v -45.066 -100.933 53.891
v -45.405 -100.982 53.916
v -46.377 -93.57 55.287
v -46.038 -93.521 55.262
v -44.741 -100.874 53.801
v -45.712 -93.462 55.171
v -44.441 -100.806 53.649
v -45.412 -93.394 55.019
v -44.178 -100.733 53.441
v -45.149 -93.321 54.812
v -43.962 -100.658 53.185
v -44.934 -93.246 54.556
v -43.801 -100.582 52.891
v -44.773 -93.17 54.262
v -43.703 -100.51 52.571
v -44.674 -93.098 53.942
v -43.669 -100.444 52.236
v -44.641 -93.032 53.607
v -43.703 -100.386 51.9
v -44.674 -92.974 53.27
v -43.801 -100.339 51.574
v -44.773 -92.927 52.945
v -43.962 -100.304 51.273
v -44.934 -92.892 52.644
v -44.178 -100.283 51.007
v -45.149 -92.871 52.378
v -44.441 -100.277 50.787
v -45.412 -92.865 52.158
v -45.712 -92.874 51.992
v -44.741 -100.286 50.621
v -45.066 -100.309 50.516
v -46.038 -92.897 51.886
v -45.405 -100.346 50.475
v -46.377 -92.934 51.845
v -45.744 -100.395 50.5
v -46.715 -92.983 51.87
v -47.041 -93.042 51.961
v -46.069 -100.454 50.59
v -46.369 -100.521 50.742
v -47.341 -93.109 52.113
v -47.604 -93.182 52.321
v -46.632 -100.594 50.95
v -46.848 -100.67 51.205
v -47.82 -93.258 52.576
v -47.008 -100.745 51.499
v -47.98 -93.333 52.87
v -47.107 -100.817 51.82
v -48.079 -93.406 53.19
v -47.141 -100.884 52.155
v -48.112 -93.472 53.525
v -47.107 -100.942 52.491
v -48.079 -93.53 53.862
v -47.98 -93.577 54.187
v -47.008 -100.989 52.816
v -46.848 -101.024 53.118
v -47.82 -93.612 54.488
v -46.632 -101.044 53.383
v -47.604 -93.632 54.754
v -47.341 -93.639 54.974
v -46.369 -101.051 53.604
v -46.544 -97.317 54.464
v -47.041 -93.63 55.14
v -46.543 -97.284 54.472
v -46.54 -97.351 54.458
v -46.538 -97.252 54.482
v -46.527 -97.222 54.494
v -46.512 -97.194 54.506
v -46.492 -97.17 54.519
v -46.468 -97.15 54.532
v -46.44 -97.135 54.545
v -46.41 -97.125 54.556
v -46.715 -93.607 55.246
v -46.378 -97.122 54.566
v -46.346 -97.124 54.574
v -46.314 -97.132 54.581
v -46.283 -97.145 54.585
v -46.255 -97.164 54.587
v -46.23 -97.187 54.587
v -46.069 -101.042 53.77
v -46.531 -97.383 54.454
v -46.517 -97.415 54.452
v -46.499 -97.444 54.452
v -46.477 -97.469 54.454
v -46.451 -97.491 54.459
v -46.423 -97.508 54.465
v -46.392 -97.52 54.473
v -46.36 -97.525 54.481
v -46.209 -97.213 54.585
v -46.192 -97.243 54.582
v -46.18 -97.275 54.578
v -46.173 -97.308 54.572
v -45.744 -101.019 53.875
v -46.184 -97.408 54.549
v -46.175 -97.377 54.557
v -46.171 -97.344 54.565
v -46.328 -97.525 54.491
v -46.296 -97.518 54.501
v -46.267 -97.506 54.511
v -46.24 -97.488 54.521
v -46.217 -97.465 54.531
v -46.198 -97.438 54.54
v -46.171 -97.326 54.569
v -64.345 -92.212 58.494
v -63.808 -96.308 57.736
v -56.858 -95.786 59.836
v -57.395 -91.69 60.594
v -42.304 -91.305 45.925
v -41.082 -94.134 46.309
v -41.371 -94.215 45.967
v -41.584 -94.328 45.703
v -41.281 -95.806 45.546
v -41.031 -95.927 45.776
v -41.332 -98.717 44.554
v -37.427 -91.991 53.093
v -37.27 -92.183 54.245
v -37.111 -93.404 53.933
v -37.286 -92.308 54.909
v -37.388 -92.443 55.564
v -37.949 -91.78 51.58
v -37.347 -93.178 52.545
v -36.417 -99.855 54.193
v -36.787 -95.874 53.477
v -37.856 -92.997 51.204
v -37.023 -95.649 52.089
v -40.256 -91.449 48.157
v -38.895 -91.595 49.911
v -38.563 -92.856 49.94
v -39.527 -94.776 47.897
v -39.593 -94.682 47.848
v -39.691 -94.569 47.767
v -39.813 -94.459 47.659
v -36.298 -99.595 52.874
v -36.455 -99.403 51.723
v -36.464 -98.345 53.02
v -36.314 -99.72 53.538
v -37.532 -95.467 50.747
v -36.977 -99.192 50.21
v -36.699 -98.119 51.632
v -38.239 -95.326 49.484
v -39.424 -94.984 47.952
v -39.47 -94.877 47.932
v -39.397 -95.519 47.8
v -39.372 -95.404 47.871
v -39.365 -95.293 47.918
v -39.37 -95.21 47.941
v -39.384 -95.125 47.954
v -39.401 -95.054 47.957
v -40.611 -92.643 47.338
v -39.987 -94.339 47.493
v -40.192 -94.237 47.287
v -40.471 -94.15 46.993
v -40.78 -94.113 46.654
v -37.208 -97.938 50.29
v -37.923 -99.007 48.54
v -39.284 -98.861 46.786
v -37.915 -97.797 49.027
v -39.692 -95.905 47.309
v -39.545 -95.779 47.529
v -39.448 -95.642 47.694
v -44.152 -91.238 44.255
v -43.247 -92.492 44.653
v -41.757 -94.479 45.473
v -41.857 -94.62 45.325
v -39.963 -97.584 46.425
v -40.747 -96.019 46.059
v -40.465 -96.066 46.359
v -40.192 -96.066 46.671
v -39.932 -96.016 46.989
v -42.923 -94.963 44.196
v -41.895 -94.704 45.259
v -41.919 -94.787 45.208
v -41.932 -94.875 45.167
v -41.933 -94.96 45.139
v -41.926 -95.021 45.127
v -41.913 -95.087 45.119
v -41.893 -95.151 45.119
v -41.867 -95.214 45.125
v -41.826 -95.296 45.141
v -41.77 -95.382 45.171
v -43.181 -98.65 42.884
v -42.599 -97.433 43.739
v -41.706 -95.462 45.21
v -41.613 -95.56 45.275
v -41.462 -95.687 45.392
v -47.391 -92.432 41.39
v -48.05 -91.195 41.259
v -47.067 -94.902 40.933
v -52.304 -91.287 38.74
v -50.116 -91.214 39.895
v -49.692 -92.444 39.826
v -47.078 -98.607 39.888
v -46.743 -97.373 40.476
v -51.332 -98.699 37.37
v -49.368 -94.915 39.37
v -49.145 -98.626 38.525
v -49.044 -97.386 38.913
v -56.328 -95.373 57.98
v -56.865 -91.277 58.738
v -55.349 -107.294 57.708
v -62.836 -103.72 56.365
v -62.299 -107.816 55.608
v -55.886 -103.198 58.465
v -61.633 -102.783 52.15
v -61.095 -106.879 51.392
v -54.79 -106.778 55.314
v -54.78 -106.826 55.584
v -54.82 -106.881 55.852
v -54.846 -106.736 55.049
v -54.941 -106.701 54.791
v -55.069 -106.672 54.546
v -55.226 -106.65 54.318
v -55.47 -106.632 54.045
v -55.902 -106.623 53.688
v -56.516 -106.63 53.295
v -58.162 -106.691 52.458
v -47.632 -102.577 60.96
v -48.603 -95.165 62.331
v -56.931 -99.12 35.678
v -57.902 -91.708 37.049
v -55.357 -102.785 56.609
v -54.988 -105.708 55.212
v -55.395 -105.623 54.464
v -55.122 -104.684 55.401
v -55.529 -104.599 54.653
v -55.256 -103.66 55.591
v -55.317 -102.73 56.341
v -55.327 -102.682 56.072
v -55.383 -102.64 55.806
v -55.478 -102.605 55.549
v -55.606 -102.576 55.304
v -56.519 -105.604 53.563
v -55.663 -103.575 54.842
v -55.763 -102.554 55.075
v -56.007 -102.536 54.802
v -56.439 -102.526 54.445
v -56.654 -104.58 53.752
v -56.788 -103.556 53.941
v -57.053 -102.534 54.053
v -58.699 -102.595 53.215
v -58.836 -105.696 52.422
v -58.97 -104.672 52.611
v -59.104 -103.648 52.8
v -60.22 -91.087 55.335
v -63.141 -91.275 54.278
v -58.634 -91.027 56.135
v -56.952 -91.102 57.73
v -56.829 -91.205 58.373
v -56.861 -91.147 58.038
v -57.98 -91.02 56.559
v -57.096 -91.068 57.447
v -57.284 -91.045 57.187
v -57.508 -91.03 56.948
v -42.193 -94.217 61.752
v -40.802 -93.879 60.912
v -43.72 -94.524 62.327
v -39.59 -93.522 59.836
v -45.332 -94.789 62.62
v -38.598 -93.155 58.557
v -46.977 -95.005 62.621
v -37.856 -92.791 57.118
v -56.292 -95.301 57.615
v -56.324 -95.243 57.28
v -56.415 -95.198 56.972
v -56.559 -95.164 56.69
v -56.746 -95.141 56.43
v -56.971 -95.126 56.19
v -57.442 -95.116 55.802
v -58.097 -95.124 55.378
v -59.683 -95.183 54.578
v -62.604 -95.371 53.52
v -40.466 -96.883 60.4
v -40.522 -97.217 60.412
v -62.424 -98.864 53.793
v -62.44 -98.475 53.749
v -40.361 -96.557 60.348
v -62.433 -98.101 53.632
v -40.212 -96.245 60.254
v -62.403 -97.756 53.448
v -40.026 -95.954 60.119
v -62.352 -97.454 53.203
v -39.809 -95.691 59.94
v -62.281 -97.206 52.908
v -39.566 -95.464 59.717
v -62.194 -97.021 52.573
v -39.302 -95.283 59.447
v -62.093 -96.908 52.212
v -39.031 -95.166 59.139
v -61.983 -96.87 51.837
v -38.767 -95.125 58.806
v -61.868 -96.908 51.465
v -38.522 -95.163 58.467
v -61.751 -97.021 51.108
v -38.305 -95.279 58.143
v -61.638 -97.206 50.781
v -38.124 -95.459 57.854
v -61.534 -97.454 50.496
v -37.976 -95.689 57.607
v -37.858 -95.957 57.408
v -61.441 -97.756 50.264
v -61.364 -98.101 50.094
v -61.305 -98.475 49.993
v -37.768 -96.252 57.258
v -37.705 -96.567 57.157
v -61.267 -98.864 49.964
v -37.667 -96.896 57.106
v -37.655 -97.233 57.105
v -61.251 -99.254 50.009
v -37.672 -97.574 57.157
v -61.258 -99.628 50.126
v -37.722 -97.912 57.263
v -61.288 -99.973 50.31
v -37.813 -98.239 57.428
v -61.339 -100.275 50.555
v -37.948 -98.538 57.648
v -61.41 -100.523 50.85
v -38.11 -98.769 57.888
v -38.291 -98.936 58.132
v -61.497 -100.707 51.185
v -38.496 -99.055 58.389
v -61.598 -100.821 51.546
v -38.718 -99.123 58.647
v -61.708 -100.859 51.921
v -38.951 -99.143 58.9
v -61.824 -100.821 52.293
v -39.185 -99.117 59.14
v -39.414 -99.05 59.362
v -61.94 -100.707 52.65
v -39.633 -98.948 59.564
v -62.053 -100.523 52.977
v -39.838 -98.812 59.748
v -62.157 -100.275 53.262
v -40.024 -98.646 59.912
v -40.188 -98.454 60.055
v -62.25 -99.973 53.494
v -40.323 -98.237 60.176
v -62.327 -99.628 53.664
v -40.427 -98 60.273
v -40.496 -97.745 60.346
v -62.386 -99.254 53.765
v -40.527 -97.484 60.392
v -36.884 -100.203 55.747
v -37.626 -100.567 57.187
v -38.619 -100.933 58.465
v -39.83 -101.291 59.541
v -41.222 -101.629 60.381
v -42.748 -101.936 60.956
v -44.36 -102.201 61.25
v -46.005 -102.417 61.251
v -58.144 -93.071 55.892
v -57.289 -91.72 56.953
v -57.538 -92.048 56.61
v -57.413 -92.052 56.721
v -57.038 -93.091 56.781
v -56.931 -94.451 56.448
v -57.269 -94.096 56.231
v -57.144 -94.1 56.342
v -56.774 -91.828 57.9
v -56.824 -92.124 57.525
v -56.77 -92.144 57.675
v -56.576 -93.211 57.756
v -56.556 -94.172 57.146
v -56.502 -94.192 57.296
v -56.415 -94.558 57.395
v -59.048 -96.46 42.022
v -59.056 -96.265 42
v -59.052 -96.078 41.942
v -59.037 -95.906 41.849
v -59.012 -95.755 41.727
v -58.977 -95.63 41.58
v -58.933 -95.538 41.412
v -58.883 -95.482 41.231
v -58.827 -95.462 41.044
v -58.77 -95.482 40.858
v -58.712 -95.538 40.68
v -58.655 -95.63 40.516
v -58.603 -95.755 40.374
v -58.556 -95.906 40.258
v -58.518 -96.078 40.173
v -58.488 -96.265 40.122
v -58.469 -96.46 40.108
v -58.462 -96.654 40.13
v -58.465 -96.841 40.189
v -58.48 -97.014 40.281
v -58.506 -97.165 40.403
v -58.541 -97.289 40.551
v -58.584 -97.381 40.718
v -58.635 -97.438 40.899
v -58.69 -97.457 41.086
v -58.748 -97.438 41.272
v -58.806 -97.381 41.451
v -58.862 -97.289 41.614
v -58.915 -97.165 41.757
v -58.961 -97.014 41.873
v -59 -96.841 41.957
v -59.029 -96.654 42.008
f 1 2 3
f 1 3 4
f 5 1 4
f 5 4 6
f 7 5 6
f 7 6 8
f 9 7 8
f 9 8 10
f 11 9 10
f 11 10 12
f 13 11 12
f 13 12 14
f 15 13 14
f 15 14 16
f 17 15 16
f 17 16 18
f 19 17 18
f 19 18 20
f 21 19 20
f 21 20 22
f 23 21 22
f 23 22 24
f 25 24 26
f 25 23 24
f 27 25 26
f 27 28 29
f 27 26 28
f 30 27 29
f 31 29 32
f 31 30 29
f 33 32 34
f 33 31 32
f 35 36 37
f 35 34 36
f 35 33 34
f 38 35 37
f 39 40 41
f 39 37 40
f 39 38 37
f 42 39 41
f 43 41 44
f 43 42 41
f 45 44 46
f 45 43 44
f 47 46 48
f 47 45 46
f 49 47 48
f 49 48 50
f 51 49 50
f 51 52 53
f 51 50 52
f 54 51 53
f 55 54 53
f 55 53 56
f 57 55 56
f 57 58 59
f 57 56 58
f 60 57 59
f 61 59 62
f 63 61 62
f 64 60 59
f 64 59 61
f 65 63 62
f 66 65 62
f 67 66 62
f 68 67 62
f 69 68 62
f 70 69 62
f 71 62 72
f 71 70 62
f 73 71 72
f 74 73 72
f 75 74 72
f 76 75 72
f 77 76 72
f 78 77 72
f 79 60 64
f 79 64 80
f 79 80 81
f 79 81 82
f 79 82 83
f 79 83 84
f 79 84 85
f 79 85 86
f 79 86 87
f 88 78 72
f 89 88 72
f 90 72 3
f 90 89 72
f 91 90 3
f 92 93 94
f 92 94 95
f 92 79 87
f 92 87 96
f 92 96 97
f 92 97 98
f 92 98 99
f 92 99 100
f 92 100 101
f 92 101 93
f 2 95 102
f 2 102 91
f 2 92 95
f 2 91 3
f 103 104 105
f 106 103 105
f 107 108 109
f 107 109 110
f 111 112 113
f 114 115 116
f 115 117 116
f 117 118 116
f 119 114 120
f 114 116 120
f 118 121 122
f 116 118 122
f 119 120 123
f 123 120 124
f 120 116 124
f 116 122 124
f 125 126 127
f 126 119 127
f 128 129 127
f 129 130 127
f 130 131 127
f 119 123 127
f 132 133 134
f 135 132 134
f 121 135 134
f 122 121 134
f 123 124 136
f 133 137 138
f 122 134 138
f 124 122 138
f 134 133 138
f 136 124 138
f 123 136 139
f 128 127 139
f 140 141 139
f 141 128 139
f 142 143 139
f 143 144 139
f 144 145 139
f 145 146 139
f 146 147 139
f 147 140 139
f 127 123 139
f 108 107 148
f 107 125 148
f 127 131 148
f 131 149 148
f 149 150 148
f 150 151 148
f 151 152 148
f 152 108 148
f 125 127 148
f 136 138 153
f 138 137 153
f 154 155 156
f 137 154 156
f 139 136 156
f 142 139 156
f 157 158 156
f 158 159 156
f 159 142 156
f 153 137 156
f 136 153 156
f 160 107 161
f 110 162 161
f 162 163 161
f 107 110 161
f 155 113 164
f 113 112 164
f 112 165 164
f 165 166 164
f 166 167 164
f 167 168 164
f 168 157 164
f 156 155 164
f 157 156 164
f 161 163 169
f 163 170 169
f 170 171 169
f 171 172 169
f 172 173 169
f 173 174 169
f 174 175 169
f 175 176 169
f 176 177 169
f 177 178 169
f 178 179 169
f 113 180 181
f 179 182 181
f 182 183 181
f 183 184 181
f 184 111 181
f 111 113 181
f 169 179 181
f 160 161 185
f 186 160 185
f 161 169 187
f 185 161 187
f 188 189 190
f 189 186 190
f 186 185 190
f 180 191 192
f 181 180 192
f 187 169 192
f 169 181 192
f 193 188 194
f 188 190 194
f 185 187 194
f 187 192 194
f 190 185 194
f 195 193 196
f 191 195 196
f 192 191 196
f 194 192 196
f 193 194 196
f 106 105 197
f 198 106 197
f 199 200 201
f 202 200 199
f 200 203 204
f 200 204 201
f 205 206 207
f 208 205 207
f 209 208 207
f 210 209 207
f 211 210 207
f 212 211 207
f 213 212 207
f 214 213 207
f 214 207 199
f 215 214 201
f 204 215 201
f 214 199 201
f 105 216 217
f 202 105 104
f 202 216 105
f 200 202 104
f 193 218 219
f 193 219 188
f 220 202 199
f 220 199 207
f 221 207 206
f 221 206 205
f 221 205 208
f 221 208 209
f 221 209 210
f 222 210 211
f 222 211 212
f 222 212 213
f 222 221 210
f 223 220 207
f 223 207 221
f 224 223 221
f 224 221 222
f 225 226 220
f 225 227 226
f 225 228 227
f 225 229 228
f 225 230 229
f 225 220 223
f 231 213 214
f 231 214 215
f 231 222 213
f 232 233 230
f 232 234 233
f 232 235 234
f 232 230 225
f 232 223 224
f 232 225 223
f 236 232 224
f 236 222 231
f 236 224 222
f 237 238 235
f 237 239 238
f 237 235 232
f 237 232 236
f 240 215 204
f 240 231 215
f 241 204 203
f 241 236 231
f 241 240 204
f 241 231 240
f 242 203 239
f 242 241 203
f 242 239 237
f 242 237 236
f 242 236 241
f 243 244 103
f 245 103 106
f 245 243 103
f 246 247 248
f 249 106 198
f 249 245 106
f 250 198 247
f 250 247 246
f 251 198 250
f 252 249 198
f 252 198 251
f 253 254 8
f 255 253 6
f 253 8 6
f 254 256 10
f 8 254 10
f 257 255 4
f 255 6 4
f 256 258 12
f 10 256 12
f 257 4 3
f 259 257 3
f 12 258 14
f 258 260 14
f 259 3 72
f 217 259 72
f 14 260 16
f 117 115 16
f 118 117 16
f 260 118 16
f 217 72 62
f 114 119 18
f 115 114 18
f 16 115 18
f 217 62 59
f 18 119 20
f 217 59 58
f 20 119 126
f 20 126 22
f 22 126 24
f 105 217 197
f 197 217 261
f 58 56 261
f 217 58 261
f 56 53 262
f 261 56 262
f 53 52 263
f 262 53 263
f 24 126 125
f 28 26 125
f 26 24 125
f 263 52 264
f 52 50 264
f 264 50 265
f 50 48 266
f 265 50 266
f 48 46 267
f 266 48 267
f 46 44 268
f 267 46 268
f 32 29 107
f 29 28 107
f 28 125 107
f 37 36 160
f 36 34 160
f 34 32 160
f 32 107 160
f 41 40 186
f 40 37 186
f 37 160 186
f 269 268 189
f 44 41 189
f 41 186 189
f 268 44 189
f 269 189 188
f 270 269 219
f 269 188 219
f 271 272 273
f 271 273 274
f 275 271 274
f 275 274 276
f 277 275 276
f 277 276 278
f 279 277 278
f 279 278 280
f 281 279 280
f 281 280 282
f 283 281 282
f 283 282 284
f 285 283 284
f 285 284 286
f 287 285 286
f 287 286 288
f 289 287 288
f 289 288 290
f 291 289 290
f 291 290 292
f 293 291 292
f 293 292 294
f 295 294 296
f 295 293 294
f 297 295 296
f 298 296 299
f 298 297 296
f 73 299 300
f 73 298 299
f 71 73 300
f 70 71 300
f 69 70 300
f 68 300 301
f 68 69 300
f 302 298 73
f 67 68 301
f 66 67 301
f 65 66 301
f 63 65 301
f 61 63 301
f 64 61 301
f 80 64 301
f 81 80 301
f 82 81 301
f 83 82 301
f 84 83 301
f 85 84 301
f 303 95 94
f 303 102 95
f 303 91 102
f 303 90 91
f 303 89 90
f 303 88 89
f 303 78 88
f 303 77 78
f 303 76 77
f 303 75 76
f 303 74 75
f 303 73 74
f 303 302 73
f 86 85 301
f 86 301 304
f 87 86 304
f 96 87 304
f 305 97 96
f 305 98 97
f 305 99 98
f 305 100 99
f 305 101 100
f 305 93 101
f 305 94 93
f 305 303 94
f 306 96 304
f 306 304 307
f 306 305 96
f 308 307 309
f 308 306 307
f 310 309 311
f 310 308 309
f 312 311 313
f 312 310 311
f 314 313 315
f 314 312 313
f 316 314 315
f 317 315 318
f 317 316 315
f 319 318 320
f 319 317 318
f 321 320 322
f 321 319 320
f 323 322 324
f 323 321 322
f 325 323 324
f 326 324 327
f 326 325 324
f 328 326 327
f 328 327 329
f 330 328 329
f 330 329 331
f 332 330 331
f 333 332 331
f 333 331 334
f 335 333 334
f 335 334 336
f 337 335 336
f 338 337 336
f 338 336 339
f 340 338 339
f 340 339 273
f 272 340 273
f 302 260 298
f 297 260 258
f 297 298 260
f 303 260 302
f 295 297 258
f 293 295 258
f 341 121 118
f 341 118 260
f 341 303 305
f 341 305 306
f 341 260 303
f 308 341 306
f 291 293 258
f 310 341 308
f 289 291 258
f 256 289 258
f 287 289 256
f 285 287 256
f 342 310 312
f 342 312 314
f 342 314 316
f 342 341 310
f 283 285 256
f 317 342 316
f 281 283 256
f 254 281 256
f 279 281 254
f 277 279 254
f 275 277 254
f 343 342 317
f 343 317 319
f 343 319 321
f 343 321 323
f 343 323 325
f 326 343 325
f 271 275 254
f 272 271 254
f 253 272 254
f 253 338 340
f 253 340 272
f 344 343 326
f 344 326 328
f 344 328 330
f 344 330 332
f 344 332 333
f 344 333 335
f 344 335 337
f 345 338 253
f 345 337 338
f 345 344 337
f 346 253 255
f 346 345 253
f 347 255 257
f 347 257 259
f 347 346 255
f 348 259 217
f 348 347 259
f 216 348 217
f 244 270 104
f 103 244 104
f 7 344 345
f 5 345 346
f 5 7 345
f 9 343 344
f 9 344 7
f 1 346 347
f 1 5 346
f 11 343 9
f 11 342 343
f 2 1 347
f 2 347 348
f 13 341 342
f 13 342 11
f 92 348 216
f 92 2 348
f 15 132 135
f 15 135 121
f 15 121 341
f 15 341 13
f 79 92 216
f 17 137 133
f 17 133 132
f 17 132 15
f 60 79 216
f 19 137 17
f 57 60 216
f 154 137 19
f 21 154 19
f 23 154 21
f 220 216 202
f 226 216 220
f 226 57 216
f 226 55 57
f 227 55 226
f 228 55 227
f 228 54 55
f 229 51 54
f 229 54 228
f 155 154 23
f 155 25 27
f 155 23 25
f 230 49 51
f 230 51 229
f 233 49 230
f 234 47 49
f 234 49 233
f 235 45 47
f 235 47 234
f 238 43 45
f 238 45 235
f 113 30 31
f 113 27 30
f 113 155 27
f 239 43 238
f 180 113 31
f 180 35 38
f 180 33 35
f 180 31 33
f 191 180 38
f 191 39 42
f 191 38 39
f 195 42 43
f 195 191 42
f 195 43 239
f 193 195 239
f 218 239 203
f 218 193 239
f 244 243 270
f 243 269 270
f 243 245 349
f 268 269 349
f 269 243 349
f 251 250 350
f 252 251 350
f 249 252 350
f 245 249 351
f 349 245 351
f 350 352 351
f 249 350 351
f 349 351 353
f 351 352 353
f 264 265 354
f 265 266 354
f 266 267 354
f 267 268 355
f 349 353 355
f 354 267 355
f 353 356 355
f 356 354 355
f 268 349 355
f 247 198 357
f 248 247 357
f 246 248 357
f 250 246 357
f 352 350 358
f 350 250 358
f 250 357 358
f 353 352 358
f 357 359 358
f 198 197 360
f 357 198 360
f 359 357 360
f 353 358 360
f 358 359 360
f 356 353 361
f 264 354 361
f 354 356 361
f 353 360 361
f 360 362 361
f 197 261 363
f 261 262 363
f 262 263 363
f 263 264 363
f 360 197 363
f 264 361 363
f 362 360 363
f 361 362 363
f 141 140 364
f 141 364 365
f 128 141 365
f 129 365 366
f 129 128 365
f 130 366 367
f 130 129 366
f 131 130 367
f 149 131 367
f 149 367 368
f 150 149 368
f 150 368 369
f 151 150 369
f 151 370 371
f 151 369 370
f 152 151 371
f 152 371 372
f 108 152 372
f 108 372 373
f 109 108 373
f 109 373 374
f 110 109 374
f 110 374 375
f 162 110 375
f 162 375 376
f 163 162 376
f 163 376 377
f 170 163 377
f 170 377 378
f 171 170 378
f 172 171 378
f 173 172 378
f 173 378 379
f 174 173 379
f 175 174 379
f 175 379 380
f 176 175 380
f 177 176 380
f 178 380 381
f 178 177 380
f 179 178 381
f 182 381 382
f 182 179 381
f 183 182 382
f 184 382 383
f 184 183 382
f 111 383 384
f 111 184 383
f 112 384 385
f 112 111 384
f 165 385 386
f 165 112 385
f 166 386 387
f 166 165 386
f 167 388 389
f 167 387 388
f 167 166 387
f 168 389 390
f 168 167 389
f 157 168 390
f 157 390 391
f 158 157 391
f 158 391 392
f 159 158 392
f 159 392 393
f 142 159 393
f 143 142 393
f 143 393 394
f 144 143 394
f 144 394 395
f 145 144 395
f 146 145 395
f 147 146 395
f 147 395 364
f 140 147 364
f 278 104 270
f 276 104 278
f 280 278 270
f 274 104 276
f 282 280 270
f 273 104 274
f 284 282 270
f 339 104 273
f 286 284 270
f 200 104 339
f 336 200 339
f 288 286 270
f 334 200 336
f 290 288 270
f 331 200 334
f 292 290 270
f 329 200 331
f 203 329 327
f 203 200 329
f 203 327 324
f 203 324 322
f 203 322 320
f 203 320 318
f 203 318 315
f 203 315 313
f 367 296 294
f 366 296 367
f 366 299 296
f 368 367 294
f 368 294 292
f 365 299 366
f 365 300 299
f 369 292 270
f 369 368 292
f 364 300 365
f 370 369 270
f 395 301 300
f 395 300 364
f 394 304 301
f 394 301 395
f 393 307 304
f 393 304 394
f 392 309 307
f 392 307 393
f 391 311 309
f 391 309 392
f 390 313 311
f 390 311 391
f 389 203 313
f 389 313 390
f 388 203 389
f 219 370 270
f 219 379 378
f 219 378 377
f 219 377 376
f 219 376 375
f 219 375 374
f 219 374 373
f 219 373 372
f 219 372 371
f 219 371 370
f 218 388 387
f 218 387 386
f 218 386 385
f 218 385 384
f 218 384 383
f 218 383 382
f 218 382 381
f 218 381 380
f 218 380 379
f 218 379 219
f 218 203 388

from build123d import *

# Parameters (mm, degrees)
SKETCH6_R               = 1.75
BOSS_EXTRUDE2_DEPTH     = 8
CUT_EXTRUDE4_DEPTH      = 107.173115528
CUT_EXTRUDE4_DEPTH_BACK = 107.173115528
CUT_EXTRUDE5_DEPTH      = 128.383624047
CUT_EXTRUDE5_DEPTH_BACK = 128.383624047
SKETCH8_R               = 1
SKETCH8_R_2             = 2
BOSS_EXTRUDE3_DEPTH     = 4.2
BOSS_EXTRUDE4_DEPTH     = 4.2


with BuildPart() as part:
    # Sketch6 → Boss-Extrude2 (new body)
    with BuildSketch(Plane(origin=(10.632574288, -81.095368055, -14.997352737), x_dir=(0.9917912583823046, 0.12573545426534224, 0.023252856537050268), z_dir=(-0.1278675087598277, 0.9752541956794009, 0.18035840433226386))):
        with BuildLine():
            Line((-58.720707619, -78.597122513), (-74.050825307, -74.287276551))
            Line((-74.050825307, -74.287276551), (-68.096662632, -53.10832599))
            Line((-68.096662632, -53.10832599), (-62.452093156, -54.695216936))
            add(Edge.make_bspline(
                [(-47.41282256, -71.448172315), (-46.98839964, -69.542379881), (-48.131042307, -66.495548615), (-50.899587461, -63.269699296), (-53.030599864, -61.025429488), (-55.421207388, -59.185223607), (-58.285739447, -56.985315978), (-60.74445703, -55.433736114), (-62.452093156, -54.695216936)],
                knots=[0, 0, 0, 0, 0.242004987, 0.382339127, 0.541586979, 0.632723015, 0.764707251, 1, 1, 1, 1], degree=3))
            ThreePointArc((-47.41282256, -71.448172315), (-51.536232304, -77.44357473), (-58.720707619, -78.597122513))
        make_face()
        with Locations(Location((-56.475493646, -69.630875245, 0), (0, 0, 270))):
            Circle(SKETCH6_R, mode=Mode.SUBTRACT)
    extrude(amount=BOSS_EXTRUDE2_DEPTH)

    # Sketch7 → Cut-Extrude4 (cut, two sides: drawn at the far end of the back side and taken through both)
    with BuildSketch(Plane(origin=(-24.575718662, -19.143853045, 86.09350443), x_dir=(0.9633013905822628, -0.058263627508971086, 0.26202248111903403), z_dir=(-0.2684221132885267, -0.20909392565369475, 0.9403346741200436)).offset(-CUT_EXTRUDE4_DEPTH_BACK)):
        Polygon((-40.726646112, -81.480078367), (-46.231379687, -82.217293899), (-46.664686567, -78.981823637), (-9.709847833, -74.032686551), (-9.276540953, -77.268156813), align=None)
        Polygon((-8.267725772, -84.80090478), (-39.717830931, -89.012826334), (-45.222564506, -89.750041866), (-44.789257627, -92.985512128), (-7.834418892, -88.036375042), align=None)
    extrude(amount=CUT_EXTRUDE4_DEPTH + CUT_EXTRUDE4_DEPTH_BACK, mode=Mode.SUBTRACT)

    # Sketch8 → Cut-Extrude5 (cut, two sides: drawn at the far end of the back side and taken through both)
    with BuildSketch(Plane(origin=(-48.867242553, -3.67618954, -14.766782297), x_dir=(-0.2877031657138141, -0.02164336093403552, 0.9574750405967399), z_dir=(-0.9547771830648638, -0.07182606814000152, -0.28851611156791795)).offset(-CUT_EXTRUDE5_DEPTH_BACK)):
        with Locations(Location((58.311594019, -91.780155744, 0), (0, 0, 1.243382016))):
            Circle(SKETCH8_R)
        with Locations(Location((69.605725243, -93.946396702, 0), (0, 0, 1.243382016))):
            Circle(SKETCH8_R_2)
    extrude(amount=CUT_EXTRUDE5_DEPTH + CUT_EXTRUDE5_DEPTH_BACK, mode=Mode.SUBTRACT)

    # Sketch9 → Boss-Extrude3 (add)
    with BuildSketch(Plane(origin=(9.63520772, -73.488385329, -13.590557183), x_dir=(0.9917912583823045, 0.12573545426534377, 0.023252856537050493), z_dir=(-0.12786750875982922, 0.9752541956794007, 0.18035840433226338))):
        with BuildLine():
            Line((-72.837409201, -69.971156701), (-74.050825307, -74.287276551))
            Line((-74.050825307, -74.287276551), (-67.043797112, -76.257203513))
            Line((-67.043797112, -76.257203513), (-66.509603126, -74.35707605))
            add(Edge.make_bspline(
                [(-66.509603126, -74.35707605), (-66.28129752, -73.149516128), (-68.619660453, -71.253742741), (-71.184936574, -70.487242661), (-72.837409201, -69.971156701)],
                knots=[0, 0, 0, 0, 0.375545962, 1, 1, 1, 1], degree=3))
        make_face()
    extrude(amount=BOSS_EXTRUDE3_DEPTH)

    # Sketch10 → Boss-Extrude4 (add)
    with BuildSketch(Plane(origin=(10.607000786, -80.900317216, -14.961281056), x_dir=(0.9917912583823054, 0.125735454265337, 0.023252856537049508), z_dir=(0.12786750875982242, -0.9752541956794013, -0.18035840433226552))):
        with BuildLine():
            Line((-67.043797112, 76.257203513), (-66.509603126, 74.35707605))
            add(Edge.make_bspline(
                [(-66.509603126, 74.35707605), (-66.370424117, 73.7937033), (-66.780315698, 72.705301804), (-68.402176626, 71.635929848), (-70.387506863, 70.717291368), (-72.029898632, 70.225000611), (-72.837409201, 69.971156701)],
                knots=[0, 0, 0, 0, 0.205424682, 0.379782812, 0.692407492, 1, 1, 1, 1], degree=3))
            Line((-72.837409201, 69.971156701), (-74.050825307, 74.287276551))
            Line((-74.050825307, 74.287276551), (-67.043797112, 76.257203513))
        make_face()
    extrude(amount=BOSS_EXTRUDE4_DEPTH)


solid = part.part
